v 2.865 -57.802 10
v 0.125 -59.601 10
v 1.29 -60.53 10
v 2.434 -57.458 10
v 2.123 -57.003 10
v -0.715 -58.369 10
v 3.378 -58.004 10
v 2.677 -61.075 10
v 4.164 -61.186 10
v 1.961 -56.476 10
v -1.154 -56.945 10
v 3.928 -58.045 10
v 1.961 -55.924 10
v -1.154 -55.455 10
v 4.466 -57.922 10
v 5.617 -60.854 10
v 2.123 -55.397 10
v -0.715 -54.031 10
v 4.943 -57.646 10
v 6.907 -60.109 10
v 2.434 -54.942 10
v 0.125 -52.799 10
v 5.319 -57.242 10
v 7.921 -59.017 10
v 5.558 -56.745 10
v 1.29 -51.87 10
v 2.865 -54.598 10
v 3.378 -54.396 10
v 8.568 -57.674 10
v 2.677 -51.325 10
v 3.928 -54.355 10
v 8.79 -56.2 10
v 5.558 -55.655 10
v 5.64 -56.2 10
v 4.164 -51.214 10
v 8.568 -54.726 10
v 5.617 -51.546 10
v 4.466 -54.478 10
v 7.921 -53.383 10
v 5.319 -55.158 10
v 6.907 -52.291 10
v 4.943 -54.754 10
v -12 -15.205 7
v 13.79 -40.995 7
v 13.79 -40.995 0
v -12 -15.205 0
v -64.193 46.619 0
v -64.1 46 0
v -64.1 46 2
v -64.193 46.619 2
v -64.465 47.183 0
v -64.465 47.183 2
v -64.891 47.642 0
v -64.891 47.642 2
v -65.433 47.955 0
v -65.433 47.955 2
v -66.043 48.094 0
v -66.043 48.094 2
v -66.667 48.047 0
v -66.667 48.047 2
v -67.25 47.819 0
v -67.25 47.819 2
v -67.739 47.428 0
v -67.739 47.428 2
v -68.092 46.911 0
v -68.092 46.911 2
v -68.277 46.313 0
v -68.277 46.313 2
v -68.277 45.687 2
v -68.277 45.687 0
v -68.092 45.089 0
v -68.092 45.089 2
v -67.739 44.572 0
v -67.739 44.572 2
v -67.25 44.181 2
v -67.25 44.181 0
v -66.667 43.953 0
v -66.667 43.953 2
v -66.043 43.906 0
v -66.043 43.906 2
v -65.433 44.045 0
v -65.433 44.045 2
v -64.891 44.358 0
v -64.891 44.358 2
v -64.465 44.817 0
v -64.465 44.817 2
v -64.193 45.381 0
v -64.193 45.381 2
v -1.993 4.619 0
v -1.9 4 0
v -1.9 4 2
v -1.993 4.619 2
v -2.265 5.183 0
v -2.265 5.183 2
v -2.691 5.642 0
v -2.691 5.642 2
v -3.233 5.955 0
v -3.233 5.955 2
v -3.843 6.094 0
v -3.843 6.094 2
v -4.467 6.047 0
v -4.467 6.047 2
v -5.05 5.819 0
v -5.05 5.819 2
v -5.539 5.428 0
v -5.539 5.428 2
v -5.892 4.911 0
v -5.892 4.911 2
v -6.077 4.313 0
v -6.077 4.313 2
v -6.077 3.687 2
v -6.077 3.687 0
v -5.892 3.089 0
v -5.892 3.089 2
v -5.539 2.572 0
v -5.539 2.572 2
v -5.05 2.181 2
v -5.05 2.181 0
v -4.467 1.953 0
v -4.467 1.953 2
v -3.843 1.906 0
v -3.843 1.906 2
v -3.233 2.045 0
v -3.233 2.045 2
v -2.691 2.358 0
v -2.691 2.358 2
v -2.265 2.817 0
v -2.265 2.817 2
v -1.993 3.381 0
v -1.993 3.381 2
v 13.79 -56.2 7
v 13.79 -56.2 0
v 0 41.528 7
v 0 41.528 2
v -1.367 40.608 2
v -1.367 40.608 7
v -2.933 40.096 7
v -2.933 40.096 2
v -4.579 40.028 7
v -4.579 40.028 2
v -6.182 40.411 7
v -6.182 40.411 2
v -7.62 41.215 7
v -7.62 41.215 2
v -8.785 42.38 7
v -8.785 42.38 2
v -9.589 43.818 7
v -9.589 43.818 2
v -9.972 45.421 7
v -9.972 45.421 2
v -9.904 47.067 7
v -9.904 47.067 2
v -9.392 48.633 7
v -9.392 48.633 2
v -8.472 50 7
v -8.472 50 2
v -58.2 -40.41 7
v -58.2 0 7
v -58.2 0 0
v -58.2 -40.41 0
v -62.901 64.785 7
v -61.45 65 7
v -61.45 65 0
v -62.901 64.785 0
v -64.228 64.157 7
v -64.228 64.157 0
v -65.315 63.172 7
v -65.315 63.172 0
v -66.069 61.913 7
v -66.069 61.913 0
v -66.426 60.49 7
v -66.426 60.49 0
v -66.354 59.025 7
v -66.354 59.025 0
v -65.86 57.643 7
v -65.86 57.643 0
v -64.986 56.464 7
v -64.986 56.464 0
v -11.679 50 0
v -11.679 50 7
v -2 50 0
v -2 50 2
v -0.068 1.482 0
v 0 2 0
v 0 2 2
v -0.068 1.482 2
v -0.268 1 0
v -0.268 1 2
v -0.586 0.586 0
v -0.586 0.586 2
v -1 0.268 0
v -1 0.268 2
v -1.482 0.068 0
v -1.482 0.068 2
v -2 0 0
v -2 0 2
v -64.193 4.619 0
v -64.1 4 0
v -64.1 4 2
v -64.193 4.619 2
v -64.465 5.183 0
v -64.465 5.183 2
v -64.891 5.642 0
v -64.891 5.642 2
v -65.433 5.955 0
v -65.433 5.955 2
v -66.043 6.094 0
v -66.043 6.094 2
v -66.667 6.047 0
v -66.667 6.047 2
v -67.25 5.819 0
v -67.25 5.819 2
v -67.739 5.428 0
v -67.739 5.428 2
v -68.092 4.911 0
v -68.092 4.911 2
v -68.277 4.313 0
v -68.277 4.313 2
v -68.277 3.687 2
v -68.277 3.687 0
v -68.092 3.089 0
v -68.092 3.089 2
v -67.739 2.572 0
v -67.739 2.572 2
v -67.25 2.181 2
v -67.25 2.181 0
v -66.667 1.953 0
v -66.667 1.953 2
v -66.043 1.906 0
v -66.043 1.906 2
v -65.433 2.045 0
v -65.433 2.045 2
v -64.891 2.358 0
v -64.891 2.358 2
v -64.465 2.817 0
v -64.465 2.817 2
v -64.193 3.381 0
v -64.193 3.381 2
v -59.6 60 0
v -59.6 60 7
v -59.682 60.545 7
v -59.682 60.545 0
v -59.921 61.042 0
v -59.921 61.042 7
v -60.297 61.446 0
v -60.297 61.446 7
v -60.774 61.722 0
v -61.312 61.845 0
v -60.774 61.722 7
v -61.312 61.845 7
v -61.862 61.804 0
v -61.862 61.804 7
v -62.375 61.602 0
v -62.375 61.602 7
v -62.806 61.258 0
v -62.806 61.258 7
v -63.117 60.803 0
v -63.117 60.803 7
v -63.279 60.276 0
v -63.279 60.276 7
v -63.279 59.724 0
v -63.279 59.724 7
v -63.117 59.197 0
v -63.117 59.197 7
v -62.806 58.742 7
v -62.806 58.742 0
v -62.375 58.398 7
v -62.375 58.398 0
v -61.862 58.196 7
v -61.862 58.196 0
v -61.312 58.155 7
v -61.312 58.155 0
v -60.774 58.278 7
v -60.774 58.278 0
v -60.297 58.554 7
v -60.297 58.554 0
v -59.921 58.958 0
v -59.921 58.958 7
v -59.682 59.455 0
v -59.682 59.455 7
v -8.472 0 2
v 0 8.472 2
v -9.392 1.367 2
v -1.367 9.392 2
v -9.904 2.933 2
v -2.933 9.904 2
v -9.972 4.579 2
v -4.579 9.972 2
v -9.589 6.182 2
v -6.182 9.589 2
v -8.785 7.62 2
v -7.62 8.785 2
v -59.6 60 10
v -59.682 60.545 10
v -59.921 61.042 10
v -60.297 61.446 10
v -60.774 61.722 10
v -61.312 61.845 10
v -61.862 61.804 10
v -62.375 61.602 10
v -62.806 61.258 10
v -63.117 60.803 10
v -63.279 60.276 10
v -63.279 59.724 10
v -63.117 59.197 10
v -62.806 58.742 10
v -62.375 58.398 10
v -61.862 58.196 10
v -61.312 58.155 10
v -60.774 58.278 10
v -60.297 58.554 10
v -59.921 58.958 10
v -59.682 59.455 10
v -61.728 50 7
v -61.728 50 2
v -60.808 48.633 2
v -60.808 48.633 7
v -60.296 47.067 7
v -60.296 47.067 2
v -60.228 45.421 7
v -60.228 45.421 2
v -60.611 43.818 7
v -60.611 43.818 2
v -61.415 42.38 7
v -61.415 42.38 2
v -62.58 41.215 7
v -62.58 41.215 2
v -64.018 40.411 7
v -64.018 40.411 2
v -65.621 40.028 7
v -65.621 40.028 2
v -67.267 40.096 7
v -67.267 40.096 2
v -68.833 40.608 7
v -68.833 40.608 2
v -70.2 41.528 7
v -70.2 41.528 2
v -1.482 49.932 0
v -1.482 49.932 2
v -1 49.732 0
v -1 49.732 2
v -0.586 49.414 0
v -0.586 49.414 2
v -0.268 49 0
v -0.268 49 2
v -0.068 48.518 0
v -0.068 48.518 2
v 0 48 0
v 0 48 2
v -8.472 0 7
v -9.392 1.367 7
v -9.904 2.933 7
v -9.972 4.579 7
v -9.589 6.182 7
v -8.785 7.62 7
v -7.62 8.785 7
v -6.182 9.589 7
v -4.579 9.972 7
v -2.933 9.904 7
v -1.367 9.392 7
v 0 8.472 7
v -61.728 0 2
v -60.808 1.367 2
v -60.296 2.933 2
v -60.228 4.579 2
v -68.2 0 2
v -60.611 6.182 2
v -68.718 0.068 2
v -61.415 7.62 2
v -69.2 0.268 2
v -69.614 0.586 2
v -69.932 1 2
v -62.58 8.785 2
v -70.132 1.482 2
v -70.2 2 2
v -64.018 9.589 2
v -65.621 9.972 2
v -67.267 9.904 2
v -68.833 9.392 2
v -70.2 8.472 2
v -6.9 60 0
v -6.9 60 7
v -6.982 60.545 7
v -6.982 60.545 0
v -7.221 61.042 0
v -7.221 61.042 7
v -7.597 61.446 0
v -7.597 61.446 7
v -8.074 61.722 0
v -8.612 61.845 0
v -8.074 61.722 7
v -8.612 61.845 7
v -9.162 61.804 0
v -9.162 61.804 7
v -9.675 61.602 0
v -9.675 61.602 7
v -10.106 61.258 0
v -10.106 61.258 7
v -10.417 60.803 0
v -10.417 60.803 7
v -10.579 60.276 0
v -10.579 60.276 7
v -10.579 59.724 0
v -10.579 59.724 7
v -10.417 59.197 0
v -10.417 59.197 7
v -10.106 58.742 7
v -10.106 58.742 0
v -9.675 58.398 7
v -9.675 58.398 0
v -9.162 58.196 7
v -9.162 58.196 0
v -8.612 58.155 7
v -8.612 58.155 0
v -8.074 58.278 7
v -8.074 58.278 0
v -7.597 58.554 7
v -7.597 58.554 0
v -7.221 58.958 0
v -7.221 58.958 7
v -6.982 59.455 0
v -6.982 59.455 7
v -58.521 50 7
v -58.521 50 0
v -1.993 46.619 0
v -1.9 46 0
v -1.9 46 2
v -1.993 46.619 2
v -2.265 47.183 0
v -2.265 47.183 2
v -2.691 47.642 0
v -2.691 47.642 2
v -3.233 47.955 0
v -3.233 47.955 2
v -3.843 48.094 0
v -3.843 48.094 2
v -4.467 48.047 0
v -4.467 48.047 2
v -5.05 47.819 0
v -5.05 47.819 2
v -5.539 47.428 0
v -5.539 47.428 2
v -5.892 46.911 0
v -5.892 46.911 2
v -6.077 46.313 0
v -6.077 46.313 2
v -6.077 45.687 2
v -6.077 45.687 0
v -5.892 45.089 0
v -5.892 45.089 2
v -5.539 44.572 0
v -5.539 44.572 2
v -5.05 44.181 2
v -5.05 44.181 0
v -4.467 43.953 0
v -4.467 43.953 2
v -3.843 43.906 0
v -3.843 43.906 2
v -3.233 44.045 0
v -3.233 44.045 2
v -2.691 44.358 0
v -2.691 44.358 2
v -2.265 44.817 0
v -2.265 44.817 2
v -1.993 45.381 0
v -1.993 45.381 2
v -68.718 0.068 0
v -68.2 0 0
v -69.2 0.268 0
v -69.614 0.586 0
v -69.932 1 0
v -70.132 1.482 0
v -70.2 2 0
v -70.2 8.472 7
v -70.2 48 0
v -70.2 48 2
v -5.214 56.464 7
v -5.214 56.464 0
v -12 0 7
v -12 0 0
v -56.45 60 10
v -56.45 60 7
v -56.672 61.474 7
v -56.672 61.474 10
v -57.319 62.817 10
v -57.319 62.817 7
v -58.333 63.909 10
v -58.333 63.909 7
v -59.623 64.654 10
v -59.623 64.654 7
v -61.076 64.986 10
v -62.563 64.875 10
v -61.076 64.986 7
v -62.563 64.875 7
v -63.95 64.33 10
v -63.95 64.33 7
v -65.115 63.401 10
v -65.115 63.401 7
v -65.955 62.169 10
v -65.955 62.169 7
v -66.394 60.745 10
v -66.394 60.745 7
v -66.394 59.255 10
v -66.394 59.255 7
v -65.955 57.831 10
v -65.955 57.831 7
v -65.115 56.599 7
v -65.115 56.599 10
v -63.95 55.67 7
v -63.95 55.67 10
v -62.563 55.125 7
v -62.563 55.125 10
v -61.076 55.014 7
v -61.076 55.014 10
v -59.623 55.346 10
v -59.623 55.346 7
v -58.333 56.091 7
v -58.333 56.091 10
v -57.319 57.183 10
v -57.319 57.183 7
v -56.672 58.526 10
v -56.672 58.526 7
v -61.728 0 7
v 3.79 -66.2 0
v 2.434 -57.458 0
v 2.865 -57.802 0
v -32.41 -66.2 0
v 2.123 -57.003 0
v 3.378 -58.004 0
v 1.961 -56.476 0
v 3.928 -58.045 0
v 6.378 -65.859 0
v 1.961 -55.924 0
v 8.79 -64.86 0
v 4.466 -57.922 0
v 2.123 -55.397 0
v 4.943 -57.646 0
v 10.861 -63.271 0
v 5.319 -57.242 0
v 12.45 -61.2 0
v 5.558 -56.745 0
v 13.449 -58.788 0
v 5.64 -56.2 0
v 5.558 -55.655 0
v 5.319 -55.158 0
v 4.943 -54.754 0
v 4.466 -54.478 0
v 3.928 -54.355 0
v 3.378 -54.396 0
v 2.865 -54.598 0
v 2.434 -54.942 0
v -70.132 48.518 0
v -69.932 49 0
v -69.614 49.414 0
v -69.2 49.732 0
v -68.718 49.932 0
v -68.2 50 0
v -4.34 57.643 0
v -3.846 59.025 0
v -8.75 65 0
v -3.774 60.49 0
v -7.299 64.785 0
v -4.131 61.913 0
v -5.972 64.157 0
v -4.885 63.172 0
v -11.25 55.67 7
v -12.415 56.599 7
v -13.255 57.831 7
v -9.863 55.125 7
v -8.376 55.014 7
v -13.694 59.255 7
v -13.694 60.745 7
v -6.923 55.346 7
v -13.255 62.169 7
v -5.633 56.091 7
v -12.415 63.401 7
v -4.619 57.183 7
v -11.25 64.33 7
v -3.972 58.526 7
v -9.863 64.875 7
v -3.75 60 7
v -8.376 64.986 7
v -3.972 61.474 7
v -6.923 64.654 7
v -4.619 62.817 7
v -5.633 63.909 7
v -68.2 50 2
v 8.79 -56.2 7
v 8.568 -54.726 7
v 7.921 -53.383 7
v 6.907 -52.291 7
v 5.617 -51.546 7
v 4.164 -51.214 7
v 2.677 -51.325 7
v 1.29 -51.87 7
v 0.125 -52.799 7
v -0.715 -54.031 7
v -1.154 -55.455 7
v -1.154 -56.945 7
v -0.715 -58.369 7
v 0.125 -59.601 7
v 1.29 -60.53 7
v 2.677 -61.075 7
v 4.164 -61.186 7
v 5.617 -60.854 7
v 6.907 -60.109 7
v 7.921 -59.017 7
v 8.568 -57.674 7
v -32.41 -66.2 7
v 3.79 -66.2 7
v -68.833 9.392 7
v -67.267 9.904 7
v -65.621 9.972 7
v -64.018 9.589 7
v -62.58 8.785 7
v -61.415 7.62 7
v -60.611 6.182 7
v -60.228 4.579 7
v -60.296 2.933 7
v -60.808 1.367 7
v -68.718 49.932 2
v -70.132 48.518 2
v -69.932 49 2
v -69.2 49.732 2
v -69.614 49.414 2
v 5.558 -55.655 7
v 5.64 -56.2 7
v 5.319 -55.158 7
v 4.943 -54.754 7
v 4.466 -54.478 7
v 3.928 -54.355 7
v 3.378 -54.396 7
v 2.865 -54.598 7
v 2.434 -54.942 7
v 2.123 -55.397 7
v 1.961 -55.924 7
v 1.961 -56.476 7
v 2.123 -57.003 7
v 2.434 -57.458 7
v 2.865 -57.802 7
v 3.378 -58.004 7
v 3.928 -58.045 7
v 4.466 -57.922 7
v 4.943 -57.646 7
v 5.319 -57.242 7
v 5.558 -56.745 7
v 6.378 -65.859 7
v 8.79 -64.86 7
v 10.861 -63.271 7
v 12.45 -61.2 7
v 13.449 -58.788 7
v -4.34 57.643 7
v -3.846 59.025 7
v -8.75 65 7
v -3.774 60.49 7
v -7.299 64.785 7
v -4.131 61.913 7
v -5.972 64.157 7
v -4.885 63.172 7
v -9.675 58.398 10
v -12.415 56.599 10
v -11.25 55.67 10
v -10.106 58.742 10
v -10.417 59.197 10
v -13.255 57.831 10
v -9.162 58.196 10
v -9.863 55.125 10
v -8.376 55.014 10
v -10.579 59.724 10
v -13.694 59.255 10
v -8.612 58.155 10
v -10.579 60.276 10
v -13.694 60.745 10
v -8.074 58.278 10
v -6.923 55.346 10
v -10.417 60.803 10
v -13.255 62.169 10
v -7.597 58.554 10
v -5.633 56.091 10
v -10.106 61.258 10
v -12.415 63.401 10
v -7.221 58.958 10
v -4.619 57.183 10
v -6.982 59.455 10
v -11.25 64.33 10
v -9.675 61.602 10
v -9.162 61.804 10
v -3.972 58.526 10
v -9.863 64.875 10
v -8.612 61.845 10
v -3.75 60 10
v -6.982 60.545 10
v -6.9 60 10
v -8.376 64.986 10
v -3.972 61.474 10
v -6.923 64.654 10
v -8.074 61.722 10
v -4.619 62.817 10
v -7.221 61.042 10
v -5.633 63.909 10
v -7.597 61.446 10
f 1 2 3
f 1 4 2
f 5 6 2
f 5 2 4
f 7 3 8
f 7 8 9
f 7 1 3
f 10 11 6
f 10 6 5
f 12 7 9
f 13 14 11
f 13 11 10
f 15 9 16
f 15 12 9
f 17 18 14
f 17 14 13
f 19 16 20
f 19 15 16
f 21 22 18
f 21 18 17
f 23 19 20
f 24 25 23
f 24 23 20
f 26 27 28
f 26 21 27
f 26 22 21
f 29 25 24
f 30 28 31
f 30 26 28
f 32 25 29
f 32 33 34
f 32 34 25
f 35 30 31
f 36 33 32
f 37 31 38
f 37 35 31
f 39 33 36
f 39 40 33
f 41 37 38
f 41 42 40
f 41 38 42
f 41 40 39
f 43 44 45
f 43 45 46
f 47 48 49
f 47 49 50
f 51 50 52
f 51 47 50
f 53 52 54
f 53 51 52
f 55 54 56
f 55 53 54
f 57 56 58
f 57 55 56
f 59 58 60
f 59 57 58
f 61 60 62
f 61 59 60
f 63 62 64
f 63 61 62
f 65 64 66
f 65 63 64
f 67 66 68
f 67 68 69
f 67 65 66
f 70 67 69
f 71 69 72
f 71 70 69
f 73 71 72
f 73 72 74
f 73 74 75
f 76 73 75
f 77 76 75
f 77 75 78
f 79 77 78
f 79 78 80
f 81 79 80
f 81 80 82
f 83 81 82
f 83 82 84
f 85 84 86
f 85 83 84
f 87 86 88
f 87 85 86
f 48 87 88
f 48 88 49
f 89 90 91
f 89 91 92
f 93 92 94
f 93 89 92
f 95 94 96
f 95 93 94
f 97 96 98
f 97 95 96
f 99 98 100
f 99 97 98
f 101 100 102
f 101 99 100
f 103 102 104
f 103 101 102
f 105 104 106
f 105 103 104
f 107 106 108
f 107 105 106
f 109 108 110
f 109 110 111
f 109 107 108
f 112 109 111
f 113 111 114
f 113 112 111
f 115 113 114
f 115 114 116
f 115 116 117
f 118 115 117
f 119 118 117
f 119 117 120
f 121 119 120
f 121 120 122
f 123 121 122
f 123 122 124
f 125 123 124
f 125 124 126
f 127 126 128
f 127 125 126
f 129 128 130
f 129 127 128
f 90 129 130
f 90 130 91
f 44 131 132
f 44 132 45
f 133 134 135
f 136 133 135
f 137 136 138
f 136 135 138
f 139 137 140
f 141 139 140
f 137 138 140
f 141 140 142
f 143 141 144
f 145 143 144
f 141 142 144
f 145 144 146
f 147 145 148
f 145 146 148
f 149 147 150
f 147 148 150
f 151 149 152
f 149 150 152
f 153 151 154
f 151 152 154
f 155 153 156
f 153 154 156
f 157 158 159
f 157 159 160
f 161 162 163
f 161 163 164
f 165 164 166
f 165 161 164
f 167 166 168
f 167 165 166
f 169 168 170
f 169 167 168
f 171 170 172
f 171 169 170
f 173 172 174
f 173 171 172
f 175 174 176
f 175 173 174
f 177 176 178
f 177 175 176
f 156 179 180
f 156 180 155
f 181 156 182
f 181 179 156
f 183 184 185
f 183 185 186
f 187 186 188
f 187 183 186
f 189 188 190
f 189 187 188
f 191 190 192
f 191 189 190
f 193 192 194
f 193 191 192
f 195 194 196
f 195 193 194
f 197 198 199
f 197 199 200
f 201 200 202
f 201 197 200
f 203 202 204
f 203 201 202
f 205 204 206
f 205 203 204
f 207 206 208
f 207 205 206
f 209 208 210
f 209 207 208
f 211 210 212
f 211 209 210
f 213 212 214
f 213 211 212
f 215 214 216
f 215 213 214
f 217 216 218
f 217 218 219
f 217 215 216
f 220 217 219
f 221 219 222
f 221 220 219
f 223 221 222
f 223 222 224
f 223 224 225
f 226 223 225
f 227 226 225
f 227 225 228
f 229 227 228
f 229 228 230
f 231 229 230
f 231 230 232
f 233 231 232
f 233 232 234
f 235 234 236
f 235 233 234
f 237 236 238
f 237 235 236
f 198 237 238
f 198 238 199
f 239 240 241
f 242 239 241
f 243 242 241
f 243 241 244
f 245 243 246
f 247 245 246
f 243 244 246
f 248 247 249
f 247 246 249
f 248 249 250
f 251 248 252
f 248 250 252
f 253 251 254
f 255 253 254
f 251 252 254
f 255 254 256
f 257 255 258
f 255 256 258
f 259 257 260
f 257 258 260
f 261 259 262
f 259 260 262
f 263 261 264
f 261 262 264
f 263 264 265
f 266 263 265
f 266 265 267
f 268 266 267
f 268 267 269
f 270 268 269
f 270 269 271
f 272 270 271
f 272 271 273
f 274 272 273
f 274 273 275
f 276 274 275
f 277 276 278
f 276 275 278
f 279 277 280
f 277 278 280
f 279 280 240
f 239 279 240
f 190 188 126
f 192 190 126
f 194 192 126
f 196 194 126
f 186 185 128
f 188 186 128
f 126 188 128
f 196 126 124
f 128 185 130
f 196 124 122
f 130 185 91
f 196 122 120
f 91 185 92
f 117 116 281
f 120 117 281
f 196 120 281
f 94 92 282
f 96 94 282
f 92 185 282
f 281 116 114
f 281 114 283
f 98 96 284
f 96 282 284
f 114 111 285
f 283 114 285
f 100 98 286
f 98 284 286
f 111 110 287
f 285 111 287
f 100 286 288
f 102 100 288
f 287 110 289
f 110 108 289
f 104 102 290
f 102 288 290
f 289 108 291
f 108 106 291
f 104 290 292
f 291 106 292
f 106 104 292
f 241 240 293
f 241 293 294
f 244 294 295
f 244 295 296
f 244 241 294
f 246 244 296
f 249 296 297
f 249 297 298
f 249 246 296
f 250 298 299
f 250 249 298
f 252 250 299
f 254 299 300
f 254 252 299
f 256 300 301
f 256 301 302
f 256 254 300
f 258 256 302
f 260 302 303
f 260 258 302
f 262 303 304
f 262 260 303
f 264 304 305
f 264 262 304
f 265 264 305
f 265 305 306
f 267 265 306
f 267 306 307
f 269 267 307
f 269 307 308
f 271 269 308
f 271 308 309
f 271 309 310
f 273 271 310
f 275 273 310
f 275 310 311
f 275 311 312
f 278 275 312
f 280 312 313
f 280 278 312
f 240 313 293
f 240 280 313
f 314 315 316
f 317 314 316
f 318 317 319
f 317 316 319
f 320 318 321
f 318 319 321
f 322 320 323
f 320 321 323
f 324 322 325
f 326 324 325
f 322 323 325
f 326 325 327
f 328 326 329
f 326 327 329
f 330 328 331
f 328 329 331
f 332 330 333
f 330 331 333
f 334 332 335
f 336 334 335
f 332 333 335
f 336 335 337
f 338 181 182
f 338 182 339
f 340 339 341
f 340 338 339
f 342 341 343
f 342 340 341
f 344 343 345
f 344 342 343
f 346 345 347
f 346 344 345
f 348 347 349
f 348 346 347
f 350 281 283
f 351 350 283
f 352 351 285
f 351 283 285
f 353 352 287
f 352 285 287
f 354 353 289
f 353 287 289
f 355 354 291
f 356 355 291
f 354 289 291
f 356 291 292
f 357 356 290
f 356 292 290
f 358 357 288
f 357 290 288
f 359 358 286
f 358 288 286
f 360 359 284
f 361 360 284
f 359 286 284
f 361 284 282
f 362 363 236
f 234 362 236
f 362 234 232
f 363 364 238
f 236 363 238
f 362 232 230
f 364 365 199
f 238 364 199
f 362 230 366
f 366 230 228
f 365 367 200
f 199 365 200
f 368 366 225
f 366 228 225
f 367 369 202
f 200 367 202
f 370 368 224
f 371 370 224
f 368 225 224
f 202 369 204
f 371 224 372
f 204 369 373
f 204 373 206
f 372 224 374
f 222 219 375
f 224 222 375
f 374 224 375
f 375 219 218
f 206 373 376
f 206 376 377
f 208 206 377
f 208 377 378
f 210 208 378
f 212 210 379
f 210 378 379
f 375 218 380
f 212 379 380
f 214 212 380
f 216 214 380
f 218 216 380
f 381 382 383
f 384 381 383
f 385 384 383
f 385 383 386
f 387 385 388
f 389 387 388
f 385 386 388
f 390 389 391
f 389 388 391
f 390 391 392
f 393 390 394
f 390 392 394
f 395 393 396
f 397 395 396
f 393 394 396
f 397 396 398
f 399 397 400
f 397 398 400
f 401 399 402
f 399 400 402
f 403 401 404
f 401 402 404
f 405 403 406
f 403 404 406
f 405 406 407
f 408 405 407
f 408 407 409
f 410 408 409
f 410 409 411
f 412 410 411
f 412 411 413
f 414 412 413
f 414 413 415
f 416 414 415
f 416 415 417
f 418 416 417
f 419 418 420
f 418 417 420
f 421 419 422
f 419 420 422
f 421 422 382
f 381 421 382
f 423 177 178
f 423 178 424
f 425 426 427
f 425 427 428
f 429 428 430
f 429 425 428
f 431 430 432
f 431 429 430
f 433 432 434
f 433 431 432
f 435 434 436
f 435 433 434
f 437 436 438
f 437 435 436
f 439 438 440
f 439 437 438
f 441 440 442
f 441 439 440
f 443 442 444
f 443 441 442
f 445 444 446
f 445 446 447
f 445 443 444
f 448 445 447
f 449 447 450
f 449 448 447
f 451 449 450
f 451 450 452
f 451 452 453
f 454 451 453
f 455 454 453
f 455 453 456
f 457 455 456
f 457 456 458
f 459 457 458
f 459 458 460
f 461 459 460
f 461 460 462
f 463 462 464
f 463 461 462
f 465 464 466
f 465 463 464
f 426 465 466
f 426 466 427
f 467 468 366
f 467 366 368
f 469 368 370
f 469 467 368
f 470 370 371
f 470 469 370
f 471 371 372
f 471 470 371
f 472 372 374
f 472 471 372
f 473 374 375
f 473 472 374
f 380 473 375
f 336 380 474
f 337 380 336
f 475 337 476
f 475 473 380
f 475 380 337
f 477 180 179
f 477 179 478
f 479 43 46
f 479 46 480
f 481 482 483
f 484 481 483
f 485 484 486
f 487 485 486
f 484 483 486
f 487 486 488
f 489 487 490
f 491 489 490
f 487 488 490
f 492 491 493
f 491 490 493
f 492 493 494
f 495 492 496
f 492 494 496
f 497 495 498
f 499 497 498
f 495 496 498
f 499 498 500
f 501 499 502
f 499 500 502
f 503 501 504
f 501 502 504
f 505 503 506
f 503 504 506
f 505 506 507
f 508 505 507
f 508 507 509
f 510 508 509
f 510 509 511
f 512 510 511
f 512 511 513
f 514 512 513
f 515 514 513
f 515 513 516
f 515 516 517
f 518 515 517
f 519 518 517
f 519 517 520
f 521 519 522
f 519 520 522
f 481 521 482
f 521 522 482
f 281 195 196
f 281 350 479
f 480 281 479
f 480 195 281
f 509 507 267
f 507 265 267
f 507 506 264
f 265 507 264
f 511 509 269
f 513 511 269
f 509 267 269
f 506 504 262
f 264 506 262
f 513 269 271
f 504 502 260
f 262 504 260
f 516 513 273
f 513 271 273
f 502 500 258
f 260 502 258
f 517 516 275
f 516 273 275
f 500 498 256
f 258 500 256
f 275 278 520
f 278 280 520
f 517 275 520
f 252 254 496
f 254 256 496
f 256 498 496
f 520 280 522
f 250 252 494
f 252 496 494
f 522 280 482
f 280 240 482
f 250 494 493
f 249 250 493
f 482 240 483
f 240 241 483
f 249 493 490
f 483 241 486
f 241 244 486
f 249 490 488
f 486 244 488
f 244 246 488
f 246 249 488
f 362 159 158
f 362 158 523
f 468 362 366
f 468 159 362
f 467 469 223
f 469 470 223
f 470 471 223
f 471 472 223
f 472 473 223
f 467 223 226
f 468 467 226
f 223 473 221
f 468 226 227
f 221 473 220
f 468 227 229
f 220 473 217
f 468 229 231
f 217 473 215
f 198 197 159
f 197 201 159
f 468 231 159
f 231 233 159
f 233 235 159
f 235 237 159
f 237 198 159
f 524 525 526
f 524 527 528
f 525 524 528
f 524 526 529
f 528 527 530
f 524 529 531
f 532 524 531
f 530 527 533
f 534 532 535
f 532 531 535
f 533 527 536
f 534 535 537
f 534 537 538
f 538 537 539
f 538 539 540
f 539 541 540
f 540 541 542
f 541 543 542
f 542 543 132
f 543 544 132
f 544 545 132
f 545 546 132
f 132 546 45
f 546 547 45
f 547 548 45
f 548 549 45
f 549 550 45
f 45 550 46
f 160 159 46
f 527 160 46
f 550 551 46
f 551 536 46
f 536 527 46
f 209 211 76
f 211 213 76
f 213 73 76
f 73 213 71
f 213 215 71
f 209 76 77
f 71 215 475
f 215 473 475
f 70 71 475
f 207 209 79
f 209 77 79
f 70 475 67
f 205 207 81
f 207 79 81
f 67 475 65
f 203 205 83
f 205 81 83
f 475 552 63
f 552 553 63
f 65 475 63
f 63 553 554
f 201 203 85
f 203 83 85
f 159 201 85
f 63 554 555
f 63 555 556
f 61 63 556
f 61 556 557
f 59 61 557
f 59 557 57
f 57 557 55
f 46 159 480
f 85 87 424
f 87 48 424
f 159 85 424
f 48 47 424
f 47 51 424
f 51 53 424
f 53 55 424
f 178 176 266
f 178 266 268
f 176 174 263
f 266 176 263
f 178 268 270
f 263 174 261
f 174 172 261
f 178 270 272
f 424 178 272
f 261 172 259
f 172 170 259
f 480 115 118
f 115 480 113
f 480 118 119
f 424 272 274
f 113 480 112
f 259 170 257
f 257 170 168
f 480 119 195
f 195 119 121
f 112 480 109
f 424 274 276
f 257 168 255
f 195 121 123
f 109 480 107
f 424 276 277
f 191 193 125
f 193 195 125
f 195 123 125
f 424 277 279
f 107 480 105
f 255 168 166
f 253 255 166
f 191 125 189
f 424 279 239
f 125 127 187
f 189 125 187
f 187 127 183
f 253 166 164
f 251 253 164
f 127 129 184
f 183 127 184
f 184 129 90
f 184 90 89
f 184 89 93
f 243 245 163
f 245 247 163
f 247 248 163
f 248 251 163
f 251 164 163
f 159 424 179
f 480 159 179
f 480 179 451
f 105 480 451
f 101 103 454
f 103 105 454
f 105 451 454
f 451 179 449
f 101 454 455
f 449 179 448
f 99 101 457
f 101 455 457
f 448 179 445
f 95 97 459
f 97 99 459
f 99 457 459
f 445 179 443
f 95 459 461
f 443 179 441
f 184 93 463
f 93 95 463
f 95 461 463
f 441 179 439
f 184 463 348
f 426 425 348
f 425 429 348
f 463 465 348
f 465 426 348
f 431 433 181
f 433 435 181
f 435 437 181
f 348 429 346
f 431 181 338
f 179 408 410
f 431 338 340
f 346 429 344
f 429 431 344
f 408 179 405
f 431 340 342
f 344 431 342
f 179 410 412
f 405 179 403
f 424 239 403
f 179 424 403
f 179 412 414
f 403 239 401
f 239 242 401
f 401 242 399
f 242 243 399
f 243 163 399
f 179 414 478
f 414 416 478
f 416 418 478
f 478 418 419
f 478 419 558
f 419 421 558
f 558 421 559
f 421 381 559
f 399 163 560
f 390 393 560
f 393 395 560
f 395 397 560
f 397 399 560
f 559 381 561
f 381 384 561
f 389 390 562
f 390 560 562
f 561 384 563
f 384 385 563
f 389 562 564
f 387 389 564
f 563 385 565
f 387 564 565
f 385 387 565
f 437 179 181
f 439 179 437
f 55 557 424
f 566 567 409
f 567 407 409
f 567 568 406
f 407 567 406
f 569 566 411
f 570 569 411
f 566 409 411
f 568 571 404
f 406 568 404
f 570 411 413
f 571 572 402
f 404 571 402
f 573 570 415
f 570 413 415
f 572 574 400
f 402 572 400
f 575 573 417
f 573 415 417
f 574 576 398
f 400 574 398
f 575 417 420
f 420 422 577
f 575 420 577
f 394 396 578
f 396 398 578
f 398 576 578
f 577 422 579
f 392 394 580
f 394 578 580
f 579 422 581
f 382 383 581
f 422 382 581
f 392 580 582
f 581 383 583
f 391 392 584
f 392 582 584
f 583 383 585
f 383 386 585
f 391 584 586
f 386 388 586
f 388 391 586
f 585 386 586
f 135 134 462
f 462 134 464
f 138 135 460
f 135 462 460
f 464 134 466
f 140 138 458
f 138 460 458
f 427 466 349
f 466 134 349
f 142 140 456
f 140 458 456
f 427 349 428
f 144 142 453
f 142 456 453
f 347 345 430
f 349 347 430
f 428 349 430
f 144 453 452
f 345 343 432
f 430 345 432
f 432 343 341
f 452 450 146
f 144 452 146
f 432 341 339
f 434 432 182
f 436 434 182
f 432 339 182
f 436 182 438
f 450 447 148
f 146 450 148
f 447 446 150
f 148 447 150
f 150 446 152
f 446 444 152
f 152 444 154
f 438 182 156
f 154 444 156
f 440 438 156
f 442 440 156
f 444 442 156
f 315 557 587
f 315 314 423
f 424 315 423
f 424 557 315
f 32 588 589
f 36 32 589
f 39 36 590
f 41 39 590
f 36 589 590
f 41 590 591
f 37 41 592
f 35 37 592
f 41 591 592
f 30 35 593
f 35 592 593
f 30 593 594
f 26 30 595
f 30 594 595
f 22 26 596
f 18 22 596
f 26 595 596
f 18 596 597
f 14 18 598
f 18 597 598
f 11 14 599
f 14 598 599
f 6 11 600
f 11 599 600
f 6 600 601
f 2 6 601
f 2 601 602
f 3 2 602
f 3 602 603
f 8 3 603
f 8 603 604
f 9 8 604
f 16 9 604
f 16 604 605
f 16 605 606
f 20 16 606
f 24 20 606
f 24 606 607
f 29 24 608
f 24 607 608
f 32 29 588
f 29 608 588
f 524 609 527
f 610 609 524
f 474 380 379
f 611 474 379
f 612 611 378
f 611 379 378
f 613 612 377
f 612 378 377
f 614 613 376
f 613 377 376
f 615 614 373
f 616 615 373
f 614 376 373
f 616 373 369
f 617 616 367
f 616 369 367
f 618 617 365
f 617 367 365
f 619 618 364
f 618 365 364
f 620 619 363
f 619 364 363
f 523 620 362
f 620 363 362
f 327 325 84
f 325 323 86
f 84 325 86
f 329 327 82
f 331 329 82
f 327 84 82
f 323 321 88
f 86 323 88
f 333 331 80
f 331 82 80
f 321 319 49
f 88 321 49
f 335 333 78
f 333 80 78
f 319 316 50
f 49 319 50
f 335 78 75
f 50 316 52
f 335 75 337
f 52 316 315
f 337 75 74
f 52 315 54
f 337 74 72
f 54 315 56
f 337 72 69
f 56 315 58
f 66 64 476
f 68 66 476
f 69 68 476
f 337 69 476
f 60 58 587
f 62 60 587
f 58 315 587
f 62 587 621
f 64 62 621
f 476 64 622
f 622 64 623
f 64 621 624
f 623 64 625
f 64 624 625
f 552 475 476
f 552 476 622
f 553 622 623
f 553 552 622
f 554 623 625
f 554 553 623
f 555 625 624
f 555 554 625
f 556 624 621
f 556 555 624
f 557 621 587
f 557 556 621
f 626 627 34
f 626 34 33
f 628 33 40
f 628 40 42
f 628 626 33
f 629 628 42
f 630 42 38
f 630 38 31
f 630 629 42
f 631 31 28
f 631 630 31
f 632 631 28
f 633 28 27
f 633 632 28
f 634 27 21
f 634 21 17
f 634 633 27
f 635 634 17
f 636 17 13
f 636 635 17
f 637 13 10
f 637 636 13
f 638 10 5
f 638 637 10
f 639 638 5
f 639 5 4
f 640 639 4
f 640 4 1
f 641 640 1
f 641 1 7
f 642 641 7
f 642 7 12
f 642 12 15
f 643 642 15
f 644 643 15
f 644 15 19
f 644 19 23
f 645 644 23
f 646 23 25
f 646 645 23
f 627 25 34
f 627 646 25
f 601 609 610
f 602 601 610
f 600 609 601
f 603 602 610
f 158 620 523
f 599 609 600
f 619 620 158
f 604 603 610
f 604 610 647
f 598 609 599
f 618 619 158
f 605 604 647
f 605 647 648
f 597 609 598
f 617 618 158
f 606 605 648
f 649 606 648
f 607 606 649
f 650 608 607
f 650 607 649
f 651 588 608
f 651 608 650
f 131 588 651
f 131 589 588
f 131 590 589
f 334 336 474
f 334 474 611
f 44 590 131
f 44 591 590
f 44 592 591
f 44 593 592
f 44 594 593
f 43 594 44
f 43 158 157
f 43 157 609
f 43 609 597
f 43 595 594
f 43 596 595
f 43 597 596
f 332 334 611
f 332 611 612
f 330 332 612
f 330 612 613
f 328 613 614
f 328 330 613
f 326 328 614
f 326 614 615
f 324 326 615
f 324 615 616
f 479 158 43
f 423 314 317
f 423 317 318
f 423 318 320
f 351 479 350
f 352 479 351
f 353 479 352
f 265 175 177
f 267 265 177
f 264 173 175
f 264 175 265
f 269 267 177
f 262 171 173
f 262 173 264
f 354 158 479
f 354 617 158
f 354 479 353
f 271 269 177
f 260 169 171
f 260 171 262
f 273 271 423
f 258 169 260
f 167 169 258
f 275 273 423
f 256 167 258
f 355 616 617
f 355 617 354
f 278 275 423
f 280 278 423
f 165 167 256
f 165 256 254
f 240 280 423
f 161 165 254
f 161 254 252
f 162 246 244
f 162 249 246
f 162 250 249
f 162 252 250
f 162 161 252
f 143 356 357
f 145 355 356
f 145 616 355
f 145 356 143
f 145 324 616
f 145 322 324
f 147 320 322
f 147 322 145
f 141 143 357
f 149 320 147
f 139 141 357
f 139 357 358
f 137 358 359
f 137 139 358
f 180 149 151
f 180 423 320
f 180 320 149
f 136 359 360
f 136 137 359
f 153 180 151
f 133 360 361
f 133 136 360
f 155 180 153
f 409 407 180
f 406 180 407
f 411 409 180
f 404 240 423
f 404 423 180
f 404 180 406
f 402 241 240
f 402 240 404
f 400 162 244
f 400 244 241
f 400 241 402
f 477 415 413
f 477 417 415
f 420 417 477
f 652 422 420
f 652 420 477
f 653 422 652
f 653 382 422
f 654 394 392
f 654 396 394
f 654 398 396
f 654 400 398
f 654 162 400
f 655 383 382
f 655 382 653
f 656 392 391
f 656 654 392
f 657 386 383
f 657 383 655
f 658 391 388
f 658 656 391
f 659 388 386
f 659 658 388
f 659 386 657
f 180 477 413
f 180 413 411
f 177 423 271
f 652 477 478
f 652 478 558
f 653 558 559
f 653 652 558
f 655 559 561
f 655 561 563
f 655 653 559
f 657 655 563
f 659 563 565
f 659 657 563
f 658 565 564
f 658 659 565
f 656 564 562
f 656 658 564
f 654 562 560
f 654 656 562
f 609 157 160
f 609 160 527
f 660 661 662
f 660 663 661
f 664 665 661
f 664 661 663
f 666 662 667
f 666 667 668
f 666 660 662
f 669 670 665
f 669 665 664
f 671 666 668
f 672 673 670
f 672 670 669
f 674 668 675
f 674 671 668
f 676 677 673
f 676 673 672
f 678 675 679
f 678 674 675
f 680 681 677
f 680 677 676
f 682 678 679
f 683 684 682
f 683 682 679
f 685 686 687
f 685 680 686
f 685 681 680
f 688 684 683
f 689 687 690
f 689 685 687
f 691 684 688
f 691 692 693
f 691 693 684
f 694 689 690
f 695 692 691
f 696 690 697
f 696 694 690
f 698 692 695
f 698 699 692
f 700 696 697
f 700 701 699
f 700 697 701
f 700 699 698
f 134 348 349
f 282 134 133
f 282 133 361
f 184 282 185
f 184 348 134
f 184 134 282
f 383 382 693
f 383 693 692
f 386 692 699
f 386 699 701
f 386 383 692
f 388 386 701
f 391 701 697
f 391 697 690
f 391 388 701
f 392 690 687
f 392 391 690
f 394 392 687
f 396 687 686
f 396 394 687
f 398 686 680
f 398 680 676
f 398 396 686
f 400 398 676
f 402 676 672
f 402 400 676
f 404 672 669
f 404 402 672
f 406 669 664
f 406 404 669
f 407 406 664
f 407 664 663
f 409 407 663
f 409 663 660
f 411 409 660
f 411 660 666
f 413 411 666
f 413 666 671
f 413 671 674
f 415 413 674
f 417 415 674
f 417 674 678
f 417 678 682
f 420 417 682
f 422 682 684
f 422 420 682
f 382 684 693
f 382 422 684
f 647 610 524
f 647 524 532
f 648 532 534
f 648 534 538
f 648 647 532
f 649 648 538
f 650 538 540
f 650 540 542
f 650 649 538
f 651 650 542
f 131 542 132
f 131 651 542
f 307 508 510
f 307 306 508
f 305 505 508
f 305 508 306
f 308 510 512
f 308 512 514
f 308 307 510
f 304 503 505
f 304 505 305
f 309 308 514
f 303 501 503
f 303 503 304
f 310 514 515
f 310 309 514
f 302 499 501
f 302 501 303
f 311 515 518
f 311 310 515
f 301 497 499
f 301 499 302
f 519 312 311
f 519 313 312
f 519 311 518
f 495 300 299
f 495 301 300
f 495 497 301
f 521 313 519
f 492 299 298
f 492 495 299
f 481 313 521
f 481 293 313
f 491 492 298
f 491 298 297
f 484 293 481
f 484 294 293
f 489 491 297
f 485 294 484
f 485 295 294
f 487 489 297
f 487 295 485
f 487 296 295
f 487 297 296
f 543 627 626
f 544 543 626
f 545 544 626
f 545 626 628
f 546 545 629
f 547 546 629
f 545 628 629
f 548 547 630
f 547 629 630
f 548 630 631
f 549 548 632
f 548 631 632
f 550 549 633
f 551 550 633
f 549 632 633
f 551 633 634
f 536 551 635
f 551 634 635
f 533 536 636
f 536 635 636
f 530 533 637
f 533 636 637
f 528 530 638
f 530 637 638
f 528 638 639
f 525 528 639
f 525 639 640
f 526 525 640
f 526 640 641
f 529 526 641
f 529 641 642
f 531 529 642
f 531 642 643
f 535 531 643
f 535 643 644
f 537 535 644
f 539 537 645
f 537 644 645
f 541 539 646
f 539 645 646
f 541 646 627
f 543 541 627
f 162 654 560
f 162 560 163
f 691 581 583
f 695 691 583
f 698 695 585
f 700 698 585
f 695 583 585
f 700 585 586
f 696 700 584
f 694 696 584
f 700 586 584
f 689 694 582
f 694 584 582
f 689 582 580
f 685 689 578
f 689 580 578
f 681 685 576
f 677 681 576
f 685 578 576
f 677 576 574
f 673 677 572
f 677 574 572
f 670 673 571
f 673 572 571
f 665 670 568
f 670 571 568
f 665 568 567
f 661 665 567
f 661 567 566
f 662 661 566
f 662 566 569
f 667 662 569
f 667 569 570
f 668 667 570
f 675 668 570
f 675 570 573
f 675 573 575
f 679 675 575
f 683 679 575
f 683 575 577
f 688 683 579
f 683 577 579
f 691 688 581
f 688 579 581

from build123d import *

# Parameters (mm, degrees)
SKETCH1_R             = 2.1
BOSS_EXTRUDE1_DEPTH   = 2
BOSS_EXTRUDE2_DEPTH   = 5
SKETCH3_R             = 5
SKETCH3_R_2           = 1.85
BOSS_EXTRUDE3_DEPTH   = 3
BOSS_EXTRUDE3_2_DEPTH = 3
BOSS_EXTRUDE3_3_DEPTH = 3
SKETCH4_R             = 1.85
BOSS_EXTRUDE4_DEPTH   = 7


with BuildPart() as part:
    # Sketch1 → Boss-Extrude1 (new body)
    with BuildSketch(Plane.XY):
        with BuildLine():
            Line((-68.2, 50), (-2, 50))
            ThreePointArc((-2, 50), (-0.585786438, 49.414213562), (0, 48))
            Line((0, 48), (0, 2))
            ThreePointArc((0, 2), (-0.585786438, 0.585786438), (-2, 0))
            Line((-2, 0), (-68.2, 0))
            ThreePointArc((-68.2, 0), (-69.614213562, 0.585786438), (-70.2, 2))
            Line((-70.2, 2), (-70.2, 48))
            ThreePointArc((-70.2, 48), (-69.614213562, 49.414213562), (-68.2, 50))
        make_face()
        with Locations((-66.2, 46)):
            Circle(SKETCH1_R, mode=Mode.SUBTRACT)
        with Locations((-4, 46)):
            Circle(SKETCH1_R, mode=Mode.SUBTRACT)
        with Locations((-4, 4)):
            Circle(SKETCH1_R, mode=Mode.SUBTRACT)
        with Locations((-66.2, 4)):
            Circle(SKETCH1_R, mode=Mode.SUBTRACT)
    extrude(amount=BOSS_EXTRUDE1_DEPTH)

    # Sketch2 → Boss-Extrude2 (add)
    with BuildSketch(Plane.XY.offset(2)):
        with BuildLine():
            Line((-61.727864045, 0), (-8.472135955, 0))
            ThreePointArc((-8.472135955, 0), (-8.242640687, 8.242640687), (0, 8.472135955))
            Line((0, 8.472135955), (0, 41.527864045))
            ThreePointArc((0, 41.527864045), (-8.242640687, 41.757359313), (-8.472135955, 50))
            Line((-8.472135955, 50), (-61.727864045, 50))
            ThreePointArc((-61.727864045, 50), (-61.957359313, 41.757359313), (-70.2, 41.527864045))
            Line((-70.2, 41.527864045), (-70.2, 8.472135955))
            ThreePointArc((-70.2, 8.472135955), (-61.957359313, 8.242640687), (-61.727864045, 0))
        make_face()
    extrude(amount=BOSS_EXTRUDE2_DEPTH)



with BuildPart() as body_2:
    # Sketch3 → Boss-Extrude3 (new body)
    with BuildSketch(Plane.XY.offset(7)):
        with Locations((-61.45, 60)):
            Circle(SKETCH3_R)
        with Locations((-61.45, 60)):
            Circle(SKETCH3_R_2, mode=Mode.SUBTRACT)
    extrude(amount=BOSS_EXTRUDE3_DEPTH)


with BuildPart() as body_3:
    # Sketch3 → Boss-Extrude3 2 (new body)
    with BuildSketch(Plane.XY.offset(7)):
        with Locations((-8.75, 60)):
            Circle(SKETCH3_R)
        with Locations((-8.75, 60)):
            Circle(SKETCH3_R_2, mode=Mode.SUBTRACT)
    extrude(amount=BOSS_EXTRUDE3_2_DEPTH)


with BuildPart() as body_4:
    # Sketch3 → Boss-Extrude3 3 (new body)
    with BuildSketch(Plane.XY.offset(7)):
        with Locations((3.79, -56.2)):
            Circle(SKETCH3_R)
        with Locations((3.79, -56.2)):
            Circle(SKETCH3_R_2, mode=Mode.SUBTRACT)
    extrude(amount=BOSS_EXTRUDE3_3_DEPTH)


with BuildPart() as part_1:
    add(part.part)

    add(body_4.part)  # Boss-Extrude4 merges body 4
    # Sketch4 → Boss-Extrude4 (add)
    with BuildSketch(Plane.XY.offset(7)):
        with BuildLine():
            Line((13.79, -56.2), (13.79, -40.995))
            Line((13.79, -40.995), (-12, -15.205))
            Line((-12, -15.205), (-12, 0))
            Line((-12, 0), (-58.2, 0))
            Line((-58.2, 0), (-58.2, -40.41))
            Line((-58.2, -40.41), (-32.41, -66.2))
            Line((-32.41, -66.2), (3.79, -66.2))
            ThreePointArc((3.79, -66.2), (10.861067812, -63.271067812), (13.79, -56.2))
        make_face()
        with Locations((3.79, -56.2)):
            Circle(SKETCH4_R, mode=Mode.SUBTRACT)
        with BuildLine():
            Line((-64.985533906, 56.464466094), (-58.521067812, 50))
            Line((-58.521067812, 50), (-11.678932188, 50))
            Line((-11.678932188, 50), (-5.214466094, 56.464466094))
            ThreePointArc((-5.214466094, 56.464466094), (-4.130602337, 61.913417162), (-8.75, 65))
            Line((-8.75, 65), (-61.45, 65))
            ThreePointArc((-61.45, 65), (-66.069397663, 61.913417162), (-64.985533906, 56.464466094))
        make_face()
        with Locations((-61.45, 60)):
            Circle(SKETCH4_R, mode=Mode.SUBTRACT)
        with Locations((-8.75, 60)):
            Circle(SKETCH4_R, mode=Mode.SUBTRACT)
    extrude(amount=-BOSS_EXTRUDE4_DEPTH)


solid = Compound([body_2.part, body_3.part, part_1.part])
